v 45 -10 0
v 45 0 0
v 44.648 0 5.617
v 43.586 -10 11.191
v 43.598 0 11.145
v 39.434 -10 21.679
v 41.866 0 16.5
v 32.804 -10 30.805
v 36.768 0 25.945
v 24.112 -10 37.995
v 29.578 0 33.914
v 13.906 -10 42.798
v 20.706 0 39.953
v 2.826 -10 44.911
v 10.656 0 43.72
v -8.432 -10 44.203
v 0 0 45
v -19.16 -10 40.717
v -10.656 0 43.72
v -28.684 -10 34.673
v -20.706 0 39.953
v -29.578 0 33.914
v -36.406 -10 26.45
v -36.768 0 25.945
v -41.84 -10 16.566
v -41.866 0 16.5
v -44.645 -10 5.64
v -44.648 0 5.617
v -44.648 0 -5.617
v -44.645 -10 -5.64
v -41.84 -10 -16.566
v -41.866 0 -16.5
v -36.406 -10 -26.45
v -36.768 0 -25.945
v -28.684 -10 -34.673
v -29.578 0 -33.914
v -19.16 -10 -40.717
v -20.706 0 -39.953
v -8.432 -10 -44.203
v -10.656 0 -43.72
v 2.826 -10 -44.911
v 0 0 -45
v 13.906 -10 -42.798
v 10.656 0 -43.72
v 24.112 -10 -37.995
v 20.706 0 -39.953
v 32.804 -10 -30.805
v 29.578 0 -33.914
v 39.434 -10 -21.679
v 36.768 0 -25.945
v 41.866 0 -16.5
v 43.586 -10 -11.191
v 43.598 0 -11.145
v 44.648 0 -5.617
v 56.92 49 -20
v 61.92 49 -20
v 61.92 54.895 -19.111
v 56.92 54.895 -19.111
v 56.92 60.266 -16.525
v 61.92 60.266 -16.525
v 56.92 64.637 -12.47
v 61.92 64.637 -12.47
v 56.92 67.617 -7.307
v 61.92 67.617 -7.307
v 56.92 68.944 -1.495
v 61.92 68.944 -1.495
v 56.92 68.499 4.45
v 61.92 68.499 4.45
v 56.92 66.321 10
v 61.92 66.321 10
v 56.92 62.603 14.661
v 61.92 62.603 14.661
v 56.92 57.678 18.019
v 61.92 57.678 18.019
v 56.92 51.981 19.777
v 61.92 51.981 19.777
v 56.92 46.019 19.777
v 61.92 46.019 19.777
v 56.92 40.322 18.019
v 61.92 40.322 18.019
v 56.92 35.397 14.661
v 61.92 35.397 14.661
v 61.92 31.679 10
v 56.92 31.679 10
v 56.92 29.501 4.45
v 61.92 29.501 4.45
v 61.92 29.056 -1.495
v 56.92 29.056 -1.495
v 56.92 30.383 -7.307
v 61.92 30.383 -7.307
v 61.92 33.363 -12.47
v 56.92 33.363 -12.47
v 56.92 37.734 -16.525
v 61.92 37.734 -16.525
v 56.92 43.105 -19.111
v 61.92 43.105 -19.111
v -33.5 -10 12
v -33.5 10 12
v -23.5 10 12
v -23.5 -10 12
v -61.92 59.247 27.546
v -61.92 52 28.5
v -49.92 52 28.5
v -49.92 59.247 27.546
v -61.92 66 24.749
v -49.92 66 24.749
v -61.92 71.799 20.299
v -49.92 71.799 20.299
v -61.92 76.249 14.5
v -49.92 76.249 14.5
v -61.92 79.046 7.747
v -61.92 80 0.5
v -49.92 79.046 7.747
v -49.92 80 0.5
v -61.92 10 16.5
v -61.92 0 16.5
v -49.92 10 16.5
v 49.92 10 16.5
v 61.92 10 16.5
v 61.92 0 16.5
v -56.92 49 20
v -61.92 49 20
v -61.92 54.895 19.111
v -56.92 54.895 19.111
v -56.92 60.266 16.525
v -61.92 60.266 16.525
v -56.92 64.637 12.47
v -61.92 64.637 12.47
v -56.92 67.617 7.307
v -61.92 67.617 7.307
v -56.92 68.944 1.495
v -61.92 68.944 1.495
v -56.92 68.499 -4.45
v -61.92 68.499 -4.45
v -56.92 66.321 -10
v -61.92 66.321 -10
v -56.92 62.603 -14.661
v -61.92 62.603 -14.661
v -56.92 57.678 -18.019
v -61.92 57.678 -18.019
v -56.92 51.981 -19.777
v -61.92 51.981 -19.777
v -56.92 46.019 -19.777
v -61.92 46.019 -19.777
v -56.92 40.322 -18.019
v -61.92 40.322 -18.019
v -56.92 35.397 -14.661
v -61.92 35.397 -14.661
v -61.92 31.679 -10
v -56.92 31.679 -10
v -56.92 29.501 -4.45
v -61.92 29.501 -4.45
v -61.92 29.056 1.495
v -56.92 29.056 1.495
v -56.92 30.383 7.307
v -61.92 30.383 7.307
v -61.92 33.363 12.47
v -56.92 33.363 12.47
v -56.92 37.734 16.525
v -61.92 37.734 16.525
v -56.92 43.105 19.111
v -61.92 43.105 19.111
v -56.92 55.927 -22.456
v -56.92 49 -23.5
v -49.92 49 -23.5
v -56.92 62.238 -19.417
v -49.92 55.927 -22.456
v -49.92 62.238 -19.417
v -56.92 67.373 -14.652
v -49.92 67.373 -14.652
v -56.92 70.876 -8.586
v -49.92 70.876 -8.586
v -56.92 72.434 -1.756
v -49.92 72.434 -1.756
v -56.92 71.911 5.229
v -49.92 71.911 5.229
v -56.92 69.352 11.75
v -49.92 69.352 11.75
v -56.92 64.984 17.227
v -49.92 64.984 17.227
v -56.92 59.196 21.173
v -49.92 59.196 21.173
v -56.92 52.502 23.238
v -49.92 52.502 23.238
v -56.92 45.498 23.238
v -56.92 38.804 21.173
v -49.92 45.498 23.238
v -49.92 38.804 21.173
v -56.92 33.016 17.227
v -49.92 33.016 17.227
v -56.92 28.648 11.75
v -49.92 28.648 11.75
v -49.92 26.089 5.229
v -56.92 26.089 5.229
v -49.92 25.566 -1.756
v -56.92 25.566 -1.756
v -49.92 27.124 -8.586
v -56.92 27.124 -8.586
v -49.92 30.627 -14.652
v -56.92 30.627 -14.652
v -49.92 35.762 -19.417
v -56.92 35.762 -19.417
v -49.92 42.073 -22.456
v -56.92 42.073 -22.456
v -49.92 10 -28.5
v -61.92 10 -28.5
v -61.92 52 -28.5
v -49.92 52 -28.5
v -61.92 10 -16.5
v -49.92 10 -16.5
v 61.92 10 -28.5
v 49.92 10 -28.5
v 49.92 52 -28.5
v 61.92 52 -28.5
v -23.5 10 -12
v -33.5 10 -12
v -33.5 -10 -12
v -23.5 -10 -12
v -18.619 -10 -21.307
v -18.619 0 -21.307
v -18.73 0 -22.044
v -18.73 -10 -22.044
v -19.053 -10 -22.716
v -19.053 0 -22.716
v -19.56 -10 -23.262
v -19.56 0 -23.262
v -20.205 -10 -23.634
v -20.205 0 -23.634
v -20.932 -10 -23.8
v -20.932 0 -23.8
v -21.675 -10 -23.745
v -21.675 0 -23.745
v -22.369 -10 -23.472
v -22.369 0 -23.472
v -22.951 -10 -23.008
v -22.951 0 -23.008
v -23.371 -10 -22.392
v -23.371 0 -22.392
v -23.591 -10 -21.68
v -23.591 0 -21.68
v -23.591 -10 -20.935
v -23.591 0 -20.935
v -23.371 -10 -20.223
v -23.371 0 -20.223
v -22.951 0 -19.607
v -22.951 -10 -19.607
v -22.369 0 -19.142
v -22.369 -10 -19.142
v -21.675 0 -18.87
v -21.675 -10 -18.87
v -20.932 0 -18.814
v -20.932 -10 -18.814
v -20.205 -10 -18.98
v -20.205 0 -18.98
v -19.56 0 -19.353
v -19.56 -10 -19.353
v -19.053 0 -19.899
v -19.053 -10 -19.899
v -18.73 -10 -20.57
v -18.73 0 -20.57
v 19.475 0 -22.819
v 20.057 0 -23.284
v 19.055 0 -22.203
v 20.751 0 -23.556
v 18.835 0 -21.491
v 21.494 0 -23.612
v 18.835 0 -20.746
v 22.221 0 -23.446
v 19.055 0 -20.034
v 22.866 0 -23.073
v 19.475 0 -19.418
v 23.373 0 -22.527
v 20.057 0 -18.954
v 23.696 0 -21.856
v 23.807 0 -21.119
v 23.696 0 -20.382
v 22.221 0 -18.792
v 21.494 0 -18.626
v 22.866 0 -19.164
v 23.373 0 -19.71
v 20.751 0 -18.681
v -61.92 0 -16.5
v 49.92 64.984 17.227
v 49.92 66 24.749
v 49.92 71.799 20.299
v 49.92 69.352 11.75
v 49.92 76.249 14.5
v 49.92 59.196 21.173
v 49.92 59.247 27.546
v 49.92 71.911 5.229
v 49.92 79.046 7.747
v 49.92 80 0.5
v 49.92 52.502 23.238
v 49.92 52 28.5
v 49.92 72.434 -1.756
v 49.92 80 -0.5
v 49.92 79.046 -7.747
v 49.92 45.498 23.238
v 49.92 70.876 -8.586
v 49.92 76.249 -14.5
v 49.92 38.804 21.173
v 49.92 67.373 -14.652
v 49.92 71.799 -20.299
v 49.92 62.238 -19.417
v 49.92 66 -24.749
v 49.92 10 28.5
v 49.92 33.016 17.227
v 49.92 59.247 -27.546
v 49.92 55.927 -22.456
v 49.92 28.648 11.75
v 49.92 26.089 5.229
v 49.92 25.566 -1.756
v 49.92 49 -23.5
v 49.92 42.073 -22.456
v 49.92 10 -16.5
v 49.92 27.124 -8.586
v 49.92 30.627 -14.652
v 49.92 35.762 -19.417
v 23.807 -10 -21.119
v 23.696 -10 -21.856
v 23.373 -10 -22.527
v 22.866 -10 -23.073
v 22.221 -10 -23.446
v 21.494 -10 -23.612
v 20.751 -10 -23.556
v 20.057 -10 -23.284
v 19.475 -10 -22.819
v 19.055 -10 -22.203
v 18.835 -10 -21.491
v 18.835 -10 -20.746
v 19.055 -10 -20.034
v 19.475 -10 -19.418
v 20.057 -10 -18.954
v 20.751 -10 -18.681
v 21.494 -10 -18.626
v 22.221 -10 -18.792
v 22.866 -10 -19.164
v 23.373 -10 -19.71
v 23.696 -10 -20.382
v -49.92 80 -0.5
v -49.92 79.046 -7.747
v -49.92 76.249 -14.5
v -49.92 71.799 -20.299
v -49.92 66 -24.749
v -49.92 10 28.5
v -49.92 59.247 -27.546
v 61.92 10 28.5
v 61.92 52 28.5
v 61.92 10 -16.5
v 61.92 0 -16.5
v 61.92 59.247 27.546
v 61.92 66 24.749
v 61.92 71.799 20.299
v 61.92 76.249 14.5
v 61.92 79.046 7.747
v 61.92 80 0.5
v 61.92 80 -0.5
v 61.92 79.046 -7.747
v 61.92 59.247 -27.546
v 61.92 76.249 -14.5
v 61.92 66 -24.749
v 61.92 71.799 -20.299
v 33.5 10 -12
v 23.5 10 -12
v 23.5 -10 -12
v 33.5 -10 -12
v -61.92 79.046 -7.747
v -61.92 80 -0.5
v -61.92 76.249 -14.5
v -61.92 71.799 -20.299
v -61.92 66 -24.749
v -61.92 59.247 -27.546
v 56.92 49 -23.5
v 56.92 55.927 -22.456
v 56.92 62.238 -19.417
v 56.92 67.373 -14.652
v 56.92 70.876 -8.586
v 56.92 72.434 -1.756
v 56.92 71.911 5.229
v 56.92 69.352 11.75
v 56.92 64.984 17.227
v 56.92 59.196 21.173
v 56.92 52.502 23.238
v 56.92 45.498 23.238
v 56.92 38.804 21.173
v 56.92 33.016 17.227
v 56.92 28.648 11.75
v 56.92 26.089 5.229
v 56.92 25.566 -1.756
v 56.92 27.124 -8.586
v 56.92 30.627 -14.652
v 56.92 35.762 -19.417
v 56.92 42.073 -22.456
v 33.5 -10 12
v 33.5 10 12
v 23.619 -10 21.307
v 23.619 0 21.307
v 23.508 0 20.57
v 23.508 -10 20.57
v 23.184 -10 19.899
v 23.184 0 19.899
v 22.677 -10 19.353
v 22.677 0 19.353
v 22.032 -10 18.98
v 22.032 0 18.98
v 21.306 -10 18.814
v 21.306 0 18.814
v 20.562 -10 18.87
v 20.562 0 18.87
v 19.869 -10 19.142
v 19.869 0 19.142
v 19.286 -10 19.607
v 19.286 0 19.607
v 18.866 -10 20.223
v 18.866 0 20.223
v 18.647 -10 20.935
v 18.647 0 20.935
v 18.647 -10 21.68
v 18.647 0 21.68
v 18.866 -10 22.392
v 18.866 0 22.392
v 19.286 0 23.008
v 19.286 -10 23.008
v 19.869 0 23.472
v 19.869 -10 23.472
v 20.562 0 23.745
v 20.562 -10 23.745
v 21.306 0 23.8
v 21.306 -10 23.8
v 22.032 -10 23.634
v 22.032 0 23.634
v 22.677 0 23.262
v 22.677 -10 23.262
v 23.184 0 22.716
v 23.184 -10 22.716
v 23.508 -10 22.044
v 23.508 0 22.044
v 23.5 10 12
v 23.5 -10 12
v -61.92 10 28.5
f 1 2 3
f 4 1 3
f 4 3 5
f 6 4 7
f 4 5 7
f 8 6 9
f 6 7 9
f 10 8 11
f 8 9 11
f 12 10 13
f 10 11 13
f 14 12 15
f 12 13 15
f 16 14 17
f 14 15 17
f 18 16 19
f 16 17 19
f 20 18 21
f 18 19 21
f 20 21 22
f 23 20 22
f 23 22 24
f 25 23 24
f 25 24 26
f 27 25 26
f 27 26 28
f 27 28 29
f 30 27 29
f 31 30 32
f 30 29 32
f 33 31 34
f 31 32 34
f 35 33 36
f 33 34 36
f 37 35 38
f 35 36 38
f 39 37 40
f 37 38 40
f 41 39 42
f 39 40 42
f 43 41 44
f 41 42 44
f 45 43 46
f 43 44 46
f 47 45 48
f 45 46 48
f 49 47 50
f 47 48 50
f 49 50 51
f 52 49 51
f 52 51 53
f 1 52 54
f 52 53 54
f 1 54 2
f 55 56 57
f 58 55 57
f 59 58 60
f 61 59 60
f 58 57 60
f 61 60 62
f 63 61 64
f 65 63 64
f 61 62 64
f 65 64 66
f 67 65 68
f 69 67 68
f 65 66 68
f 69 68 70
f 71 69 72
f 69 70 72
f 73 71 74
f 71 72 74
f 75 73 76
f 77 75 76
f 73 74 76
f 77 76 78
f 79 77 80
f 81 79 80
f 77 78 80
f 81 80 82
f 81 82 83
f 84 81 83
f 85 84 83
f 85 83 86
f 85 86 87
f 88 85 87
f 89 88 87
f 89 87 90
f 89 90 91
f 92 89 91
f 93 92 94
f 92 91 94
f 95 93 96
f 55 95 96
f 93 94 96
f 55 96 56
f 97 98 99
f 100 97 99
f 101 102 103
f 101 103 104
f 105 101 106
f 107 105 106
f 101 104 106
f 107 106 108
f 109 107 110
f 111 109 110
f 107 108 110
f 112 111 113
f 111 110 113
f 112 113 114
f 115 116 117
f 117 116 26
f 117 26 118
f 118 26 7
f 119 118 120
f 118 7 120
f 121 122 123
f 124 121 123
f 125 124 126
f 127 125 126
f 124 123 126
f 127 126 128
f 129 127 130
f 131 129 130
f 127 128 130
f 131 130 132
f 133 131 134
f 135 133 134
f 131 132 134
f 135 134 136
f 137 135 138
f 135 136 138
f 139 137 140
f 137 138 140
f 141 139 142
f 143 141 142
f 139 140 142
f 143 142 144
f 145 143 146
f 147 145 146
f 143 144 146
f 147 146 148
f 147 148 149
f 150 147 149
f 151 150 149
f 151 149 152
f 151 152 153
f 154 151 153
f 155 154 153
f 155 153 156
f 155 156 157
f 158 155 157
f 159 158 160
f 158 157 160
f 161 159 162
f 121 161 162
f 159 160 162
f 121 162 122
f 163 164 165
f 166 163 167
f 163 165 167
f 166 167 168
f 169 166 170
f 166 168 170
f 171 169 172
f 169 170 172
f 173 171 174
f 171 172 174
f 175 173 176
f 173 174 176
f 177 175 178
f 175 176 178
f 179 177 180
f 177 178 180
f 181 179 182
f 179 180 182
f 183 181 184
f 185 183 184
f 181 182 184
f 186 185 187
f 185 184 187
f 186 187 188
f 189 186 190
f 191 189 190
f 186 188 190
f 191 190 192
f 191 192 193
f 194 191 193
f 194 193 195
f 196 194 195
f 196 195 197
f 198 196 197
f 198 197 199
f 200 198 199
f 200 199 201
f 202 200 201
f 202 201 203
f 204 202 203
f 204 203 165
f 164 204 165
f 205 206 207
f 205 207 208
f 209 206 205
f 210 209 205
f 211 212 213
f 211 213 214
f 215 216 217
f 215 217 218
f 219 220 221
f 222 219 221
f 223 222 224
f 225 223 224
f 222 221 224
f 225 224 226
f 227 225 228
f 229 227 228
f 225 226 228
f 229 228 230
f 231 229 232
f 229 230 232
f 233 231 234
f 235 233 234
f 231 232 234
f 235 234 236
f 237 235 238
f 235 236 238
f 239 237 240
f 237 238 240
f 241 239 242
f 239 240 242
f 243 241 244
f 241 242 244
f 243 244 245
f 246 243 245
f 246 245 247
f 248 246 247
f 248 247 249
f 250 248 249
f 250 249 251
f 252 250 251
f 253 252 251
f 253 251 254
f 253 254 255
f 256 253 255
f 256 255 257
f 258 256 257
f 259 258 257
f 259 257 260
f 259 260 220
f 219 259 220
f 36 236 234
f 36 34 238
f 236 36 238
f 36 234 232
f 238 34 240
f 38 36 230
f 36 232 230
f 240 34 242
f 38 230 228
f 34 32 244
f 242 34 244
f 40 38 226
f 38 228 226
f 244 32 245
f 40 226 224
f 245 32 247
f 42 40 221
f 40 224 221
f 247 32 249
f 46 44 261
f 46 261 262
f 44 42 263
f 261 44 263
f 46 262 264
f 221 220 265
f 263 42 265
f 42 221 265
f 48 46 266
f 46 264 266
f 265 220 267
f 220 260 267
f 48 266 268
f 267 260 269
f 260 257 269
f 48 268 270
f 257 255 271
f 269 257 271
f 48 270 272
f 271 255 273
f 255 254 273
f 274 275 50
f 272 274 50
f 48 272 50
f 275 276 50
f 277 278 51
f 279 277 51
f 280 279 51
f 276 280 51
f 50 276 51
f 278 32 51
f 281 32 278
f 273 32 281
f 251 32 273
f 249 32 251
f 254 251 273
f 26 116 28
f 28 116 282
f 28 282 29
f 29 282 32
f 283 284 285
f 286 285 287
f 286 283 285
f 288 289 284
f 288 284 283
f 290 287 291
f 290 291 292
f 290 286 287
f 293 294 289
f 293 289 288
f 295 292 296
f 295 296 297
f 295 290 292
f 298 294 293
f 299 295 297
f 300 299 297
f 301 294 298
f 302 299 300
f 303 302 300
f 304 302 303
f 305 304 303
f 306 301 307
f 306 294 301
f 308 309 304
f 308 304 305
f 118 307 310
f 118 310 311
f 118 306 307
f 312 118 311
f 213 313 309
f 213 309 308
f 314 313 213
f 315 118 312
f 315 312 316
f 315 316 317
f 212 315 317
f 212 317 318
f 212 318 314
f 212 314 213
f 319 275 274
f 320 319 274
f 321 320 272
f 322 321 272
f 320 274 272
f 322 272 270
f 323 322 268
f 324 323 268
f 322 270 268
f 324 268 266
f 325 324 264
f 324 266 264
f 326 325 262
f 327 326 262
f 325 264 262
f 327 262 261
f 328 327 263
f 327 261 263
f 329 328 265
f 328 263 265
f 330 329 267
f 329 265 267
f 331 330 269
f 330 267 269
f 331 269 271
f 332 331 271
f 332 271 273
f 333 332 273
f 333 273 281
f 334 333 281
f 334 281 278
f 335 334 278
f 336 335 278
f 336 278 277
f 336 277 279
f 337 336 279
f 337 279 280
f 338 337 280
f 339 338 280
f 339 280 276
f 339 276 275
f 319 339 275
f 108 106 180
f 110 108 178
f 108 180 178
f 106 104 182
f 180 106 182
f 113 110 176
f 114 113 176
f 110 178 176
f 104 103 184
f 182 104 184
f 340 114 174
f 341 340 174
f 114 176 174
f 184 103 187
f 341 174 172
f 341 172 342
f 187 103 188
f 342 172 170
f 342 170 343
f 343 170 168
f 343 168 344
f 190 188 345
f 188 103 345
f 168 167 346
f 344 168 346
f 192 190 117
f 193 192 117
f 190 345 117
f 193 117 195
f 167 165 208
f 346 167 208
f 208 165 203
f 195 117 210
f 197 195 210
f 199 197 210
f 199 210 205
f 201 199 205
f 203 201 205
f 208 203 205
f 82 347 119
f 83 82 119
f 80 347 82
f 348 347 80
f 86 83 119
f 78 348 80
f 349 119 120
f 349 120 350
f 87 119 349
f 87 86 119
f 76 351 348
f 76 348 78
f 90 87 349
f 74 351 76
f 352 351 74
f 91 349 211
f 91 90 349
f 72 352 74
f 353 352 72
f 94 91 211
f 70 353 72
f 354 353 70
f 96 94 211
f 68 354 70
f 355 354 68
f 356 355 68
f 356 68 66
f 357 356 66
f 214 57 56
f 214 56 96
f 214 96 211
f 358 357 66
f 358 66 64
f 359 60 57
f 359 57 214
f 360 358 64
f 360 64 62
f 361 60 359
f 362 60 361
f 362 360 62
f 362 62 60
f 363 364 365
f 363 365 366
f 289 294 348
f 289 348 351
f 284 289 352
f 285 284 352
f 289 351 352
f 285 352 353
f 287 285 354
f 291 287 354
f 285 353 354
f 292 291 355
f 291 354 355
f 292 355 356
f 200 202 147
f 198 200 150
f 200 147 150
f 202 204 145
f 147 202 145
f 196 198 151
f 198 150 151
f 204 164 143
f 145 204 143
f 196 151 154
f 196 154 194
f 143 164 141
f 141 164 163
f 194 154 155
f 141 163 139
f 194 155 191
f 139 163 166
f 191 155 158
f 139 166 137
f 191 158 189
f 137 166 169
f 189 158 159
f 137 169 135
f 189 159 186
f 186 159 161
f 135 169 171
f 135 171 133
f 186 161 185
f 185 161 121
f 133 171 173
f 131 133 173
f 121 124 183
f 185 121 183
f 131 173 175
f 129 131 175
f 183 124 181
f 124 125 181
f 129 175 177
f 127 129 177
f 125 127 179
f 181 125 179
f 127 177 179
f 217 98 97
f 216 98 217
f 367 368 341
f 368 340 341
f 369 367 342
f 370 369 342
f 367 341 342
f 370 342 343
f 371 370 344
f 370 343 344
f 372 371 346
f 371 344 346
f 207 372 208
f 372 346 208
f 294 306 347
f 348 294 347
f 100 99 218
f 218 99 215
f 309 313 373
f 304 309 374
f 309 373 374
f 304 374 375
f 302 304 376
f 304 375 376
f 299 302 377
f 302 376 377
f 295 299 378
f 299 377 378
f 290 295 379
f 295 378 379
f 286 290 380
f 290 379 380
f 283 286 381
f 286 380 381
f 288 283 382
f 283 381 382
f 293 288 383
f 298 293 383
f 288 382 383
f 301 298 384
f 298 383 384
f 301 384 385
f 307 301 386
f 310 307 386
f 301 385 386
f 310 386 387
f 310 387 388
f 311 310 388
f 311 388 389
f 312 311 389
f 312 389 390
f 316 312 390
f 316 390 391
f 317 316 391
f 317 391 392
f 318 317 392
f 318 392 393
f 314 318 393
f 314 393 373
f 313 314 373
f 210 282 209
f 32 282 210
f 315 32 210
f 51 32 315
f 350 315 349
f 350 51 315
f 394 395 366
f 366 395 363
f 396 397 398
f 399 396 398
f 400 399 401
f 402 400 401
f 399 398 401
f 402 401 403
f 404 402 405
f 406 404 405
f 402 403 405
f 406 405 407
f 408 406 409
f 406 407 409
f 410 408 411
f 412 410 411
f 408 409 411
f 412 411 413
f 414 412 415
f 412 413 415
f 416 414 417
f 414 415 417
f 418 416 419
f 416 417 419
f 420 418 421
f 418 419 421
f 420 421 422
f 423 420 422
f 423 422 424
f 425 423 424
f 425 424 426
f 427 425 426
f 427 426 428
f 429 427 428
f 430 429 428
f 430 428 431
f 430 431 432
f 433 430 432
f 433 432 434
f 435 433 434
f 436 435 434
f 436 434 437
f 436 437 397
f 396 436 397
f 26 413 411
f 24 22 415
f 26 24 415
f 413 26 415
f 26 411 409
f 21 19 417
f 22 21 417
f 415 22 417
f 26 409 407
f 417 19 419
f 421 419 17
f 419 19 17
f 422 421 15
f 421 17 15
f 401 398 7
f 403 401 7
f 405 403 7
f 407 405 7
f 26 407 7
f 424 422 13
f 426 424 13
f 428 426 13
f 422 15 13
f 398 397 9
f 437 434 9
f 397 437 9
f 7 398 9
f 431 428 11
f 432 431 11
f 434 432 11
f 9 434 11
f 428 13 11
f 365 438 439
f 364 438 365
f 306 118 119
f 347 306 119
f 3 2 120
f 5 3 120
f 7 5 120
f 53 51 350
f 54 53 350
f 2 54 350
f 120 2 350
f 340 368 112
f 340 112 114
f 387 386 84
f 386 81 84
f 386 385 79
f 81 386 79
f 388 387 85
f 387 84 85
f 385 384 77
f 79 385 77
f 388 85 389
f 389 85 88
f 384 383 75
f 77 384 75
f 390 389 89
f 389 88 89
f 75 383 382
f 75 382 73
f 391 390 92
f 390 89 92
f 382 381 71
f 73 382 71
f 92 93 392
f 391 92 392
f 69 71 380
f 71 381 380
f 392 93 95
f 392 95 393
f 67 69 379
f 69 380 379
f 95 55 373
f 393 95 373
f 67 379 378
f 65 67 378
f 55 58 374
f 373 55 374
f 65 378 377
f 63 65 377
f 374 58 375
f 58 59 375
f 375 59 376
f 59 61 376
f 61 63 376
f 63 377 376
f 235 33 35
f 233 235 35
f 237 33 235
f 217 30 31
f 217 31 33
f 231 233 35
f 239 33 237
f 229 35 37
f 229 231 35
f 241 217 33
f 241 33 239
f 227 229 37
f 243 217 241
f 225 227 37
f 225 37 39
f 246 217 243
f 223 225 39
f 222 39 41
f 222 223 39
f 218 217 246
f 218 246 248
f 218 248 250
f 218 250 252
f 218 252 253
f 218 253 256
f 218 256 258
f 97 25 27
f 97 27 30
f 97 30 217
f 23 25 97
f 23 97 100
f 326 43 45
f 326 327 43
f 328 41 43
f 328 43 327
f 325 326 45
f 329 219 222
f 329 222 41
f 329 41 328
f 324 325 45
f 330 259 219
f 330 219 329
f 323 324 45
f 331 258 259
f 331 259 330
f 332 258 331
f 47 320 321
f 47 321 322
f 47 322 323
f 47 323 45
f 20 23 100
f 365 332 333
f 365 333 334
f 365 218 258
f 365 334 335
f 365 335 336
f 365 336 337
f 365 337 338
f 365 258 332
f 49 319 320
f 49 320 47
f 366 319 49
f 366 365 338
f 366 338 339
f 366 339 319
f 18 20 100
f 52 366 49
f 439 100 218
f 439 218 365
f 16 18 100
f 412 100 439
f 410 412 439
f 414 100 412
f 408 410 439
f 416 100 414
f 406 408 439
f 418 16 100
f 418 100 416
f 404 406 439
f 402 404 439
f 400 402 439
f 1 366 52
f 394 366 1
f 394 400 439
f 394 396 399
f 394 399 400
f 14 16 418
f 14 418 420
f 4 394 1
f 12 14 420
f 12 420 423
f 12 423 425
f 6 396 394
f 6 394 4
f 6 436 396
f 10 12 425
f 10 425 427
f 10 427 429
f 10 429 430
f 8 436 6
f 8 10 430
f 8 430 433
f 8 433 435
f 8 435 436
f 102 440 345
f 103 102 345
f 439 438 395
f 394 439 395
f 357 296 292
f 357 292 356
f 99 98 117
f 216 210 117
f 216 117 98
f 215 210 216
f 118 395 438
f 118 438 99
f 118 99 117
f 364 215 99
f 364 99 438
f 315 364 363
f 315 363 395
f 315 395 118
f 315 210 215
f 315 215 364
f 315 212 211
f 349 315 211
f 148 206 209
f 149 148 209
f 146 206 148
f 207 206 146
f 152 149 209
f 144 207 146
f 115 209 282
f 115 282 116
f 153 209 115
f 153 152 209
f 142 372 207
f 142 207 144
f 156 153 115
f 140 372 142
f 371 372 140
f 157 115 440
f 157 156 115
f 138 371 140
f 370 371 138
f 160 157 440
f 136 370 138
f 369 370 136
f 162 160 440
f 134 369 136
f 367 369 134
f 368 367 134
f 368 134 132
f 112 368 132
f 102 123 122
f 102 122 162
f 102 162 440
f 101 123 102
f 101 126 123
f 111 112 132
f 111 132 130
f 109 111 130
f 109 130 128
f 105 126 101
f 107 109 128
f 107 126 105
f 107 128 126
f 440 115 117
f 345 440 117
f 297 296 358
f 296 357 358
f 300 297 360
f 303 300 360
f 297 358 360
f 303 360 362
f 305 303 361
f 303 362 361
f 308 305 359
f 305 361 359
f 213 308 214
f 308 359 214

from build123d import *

# Parameters (mm, degrees)
SKETCH1_W           = 123.84
SKETCH1_H           = 33
BOSS_EXTRUDE1_DEPTH = 10
SKETCH2_W           = 12
SKETCH2_H           = 57
BOSS_EXTRUDE2_DEPTH = 70
SKETCH3_R           = 23.5
CUT_EXTRUDE1_DEPTH  = 124.84
SKETCH10_R          = 45
BOSS_EXTRUDE5_DEPTH = 10
SKETCH9_R           = 2.5
SKETCH9_W           = 10
SKETCH9_H           = 24
CUT_EXTRUDE3_DEPTH  = 21
FILLET1_R           = 28
SKETCH11_R          = 23.5
SKETCH11_R_2        = 20
BOSS_EXTRUDE6_DEPTH = 5
SKETCH12_R          = 23.5
SKETCH12_R_2        = 20
BOSS_EXTRUDE7_DEPTH = 5


with BuildPart() as part:
    # Sketch1 → Boss-Extrude1 (new body)
    with BuildSketch(Plane(origin=(0, 0, 0), x_dir=(1, 0, 0), z_dir=(0, 1, 0))):
        Rectangle(SKETCH1_W, SKETCH1_H)
    extrude(amount=BOSS_EXTRUDE1_DEPTH)

    # Sketch2 → Boss-Extrude2 (add)
    with BuildSketch(Plane(origin=(0, 10, 0), x_dir=(1, 0, 0), z_dir=(0, 1, 0))):
        with Locations((-55.92, 0)):
            Rectangle(SKETCH2_W, SKETCH2_H)
        with Locations((55.92, 0)):
            Rectangle(SKETCH2_W, SKETCH2_H)
    extrude(amount=BOSS_EXTRUDE2_DEPTH)

    # Sketch3 → Cut-Extrude1 (cut, through all)
    with BuildSketch(Plane(origin=(61.92, 0, 0), x_dir=(0, 0, -1), z_dir=(1, 0, 0))):
        with Locations((0, 49)):
            Circle(SKETCH3_R)
    extrude(amount=-CUT_EXTRUDE1_DEPTH, mode=Mode.SUBTRACT)

    # Sketch10 → Boss-Extrude5 (add)
    with BuildSketch(Plane.XZ):
        Circle(SKETCH10_R)
    extrude(amount=BOSS_EXTRUDE5_DEPTH)

    # Sketch9 → Cut-Extrude3 (cut, through all)
    with BuildSketch(Plane(origin=(0, 10, 0), x_dir=(1, 0, 0), z_dir=(0, 1, 0))):
        with Locations((21.118713953, -21.307273899)):
            Circle(SKETCH9_R)
        with Locations((21.307273899, 21.118713953)):
            Circle(SKETCH9_R)
        with Locations((-21.118713953, 21.307273899)):
            Circle(SKETCH9_R)
        with Locations((-28.5, 0)):
            Rectangle(SKETCH9_W, SKETCH9_H)
        with Locations((28.5, 0)):
            Rectangle(SKETCH9_W, SKETCH9_H)
    extrude(amount=-CUT_EXTRUDE3_DEPTH, mode=Mode.SUBTRACT)

    # Fillet1
    fillet1_edges = [part.edges().sort_by_distance(p)[0] for p in [
        (-55.92, 80, 28.5),
        (-55.92, 80, -28.5),
        (55.92, 80, -28.5),
        (55.92, 80, 28.5),
    ]]
    fillet(fillet1_edges, radius=FILLET1_R)

    # Sketch11 → Boss-Extrude6 (add)
    with BuildSketch(Plane(origin=(61.92, 0, 0), x_dir=(0, 0, -1), z_dir=(1, 0, 0))):
        with Locations((0, 49)):
            Circle(SKETCH11_R)
        with Locations((0, 49)):
            Circle(SKETCH11_R_2, mode=Mode.SUBTRACT)
    extrude(amount=-BOSS_EXTRUDE6_DEPTH)

    # Sketch12 → Boss-Extrude7 (add)
    with BuildSketch(Plane.ZY.offset(61.92)):
        with Locations((0, 49)):
            Circle(SKETCH12_R)
        with Locations((0, 49)):
            Circle(SKETCH12_R_2, mode=Mode.SUBTRACT)
    extrude(amount=-BOSS_EXTRUDE7_DEPTH)


solid = part.part
